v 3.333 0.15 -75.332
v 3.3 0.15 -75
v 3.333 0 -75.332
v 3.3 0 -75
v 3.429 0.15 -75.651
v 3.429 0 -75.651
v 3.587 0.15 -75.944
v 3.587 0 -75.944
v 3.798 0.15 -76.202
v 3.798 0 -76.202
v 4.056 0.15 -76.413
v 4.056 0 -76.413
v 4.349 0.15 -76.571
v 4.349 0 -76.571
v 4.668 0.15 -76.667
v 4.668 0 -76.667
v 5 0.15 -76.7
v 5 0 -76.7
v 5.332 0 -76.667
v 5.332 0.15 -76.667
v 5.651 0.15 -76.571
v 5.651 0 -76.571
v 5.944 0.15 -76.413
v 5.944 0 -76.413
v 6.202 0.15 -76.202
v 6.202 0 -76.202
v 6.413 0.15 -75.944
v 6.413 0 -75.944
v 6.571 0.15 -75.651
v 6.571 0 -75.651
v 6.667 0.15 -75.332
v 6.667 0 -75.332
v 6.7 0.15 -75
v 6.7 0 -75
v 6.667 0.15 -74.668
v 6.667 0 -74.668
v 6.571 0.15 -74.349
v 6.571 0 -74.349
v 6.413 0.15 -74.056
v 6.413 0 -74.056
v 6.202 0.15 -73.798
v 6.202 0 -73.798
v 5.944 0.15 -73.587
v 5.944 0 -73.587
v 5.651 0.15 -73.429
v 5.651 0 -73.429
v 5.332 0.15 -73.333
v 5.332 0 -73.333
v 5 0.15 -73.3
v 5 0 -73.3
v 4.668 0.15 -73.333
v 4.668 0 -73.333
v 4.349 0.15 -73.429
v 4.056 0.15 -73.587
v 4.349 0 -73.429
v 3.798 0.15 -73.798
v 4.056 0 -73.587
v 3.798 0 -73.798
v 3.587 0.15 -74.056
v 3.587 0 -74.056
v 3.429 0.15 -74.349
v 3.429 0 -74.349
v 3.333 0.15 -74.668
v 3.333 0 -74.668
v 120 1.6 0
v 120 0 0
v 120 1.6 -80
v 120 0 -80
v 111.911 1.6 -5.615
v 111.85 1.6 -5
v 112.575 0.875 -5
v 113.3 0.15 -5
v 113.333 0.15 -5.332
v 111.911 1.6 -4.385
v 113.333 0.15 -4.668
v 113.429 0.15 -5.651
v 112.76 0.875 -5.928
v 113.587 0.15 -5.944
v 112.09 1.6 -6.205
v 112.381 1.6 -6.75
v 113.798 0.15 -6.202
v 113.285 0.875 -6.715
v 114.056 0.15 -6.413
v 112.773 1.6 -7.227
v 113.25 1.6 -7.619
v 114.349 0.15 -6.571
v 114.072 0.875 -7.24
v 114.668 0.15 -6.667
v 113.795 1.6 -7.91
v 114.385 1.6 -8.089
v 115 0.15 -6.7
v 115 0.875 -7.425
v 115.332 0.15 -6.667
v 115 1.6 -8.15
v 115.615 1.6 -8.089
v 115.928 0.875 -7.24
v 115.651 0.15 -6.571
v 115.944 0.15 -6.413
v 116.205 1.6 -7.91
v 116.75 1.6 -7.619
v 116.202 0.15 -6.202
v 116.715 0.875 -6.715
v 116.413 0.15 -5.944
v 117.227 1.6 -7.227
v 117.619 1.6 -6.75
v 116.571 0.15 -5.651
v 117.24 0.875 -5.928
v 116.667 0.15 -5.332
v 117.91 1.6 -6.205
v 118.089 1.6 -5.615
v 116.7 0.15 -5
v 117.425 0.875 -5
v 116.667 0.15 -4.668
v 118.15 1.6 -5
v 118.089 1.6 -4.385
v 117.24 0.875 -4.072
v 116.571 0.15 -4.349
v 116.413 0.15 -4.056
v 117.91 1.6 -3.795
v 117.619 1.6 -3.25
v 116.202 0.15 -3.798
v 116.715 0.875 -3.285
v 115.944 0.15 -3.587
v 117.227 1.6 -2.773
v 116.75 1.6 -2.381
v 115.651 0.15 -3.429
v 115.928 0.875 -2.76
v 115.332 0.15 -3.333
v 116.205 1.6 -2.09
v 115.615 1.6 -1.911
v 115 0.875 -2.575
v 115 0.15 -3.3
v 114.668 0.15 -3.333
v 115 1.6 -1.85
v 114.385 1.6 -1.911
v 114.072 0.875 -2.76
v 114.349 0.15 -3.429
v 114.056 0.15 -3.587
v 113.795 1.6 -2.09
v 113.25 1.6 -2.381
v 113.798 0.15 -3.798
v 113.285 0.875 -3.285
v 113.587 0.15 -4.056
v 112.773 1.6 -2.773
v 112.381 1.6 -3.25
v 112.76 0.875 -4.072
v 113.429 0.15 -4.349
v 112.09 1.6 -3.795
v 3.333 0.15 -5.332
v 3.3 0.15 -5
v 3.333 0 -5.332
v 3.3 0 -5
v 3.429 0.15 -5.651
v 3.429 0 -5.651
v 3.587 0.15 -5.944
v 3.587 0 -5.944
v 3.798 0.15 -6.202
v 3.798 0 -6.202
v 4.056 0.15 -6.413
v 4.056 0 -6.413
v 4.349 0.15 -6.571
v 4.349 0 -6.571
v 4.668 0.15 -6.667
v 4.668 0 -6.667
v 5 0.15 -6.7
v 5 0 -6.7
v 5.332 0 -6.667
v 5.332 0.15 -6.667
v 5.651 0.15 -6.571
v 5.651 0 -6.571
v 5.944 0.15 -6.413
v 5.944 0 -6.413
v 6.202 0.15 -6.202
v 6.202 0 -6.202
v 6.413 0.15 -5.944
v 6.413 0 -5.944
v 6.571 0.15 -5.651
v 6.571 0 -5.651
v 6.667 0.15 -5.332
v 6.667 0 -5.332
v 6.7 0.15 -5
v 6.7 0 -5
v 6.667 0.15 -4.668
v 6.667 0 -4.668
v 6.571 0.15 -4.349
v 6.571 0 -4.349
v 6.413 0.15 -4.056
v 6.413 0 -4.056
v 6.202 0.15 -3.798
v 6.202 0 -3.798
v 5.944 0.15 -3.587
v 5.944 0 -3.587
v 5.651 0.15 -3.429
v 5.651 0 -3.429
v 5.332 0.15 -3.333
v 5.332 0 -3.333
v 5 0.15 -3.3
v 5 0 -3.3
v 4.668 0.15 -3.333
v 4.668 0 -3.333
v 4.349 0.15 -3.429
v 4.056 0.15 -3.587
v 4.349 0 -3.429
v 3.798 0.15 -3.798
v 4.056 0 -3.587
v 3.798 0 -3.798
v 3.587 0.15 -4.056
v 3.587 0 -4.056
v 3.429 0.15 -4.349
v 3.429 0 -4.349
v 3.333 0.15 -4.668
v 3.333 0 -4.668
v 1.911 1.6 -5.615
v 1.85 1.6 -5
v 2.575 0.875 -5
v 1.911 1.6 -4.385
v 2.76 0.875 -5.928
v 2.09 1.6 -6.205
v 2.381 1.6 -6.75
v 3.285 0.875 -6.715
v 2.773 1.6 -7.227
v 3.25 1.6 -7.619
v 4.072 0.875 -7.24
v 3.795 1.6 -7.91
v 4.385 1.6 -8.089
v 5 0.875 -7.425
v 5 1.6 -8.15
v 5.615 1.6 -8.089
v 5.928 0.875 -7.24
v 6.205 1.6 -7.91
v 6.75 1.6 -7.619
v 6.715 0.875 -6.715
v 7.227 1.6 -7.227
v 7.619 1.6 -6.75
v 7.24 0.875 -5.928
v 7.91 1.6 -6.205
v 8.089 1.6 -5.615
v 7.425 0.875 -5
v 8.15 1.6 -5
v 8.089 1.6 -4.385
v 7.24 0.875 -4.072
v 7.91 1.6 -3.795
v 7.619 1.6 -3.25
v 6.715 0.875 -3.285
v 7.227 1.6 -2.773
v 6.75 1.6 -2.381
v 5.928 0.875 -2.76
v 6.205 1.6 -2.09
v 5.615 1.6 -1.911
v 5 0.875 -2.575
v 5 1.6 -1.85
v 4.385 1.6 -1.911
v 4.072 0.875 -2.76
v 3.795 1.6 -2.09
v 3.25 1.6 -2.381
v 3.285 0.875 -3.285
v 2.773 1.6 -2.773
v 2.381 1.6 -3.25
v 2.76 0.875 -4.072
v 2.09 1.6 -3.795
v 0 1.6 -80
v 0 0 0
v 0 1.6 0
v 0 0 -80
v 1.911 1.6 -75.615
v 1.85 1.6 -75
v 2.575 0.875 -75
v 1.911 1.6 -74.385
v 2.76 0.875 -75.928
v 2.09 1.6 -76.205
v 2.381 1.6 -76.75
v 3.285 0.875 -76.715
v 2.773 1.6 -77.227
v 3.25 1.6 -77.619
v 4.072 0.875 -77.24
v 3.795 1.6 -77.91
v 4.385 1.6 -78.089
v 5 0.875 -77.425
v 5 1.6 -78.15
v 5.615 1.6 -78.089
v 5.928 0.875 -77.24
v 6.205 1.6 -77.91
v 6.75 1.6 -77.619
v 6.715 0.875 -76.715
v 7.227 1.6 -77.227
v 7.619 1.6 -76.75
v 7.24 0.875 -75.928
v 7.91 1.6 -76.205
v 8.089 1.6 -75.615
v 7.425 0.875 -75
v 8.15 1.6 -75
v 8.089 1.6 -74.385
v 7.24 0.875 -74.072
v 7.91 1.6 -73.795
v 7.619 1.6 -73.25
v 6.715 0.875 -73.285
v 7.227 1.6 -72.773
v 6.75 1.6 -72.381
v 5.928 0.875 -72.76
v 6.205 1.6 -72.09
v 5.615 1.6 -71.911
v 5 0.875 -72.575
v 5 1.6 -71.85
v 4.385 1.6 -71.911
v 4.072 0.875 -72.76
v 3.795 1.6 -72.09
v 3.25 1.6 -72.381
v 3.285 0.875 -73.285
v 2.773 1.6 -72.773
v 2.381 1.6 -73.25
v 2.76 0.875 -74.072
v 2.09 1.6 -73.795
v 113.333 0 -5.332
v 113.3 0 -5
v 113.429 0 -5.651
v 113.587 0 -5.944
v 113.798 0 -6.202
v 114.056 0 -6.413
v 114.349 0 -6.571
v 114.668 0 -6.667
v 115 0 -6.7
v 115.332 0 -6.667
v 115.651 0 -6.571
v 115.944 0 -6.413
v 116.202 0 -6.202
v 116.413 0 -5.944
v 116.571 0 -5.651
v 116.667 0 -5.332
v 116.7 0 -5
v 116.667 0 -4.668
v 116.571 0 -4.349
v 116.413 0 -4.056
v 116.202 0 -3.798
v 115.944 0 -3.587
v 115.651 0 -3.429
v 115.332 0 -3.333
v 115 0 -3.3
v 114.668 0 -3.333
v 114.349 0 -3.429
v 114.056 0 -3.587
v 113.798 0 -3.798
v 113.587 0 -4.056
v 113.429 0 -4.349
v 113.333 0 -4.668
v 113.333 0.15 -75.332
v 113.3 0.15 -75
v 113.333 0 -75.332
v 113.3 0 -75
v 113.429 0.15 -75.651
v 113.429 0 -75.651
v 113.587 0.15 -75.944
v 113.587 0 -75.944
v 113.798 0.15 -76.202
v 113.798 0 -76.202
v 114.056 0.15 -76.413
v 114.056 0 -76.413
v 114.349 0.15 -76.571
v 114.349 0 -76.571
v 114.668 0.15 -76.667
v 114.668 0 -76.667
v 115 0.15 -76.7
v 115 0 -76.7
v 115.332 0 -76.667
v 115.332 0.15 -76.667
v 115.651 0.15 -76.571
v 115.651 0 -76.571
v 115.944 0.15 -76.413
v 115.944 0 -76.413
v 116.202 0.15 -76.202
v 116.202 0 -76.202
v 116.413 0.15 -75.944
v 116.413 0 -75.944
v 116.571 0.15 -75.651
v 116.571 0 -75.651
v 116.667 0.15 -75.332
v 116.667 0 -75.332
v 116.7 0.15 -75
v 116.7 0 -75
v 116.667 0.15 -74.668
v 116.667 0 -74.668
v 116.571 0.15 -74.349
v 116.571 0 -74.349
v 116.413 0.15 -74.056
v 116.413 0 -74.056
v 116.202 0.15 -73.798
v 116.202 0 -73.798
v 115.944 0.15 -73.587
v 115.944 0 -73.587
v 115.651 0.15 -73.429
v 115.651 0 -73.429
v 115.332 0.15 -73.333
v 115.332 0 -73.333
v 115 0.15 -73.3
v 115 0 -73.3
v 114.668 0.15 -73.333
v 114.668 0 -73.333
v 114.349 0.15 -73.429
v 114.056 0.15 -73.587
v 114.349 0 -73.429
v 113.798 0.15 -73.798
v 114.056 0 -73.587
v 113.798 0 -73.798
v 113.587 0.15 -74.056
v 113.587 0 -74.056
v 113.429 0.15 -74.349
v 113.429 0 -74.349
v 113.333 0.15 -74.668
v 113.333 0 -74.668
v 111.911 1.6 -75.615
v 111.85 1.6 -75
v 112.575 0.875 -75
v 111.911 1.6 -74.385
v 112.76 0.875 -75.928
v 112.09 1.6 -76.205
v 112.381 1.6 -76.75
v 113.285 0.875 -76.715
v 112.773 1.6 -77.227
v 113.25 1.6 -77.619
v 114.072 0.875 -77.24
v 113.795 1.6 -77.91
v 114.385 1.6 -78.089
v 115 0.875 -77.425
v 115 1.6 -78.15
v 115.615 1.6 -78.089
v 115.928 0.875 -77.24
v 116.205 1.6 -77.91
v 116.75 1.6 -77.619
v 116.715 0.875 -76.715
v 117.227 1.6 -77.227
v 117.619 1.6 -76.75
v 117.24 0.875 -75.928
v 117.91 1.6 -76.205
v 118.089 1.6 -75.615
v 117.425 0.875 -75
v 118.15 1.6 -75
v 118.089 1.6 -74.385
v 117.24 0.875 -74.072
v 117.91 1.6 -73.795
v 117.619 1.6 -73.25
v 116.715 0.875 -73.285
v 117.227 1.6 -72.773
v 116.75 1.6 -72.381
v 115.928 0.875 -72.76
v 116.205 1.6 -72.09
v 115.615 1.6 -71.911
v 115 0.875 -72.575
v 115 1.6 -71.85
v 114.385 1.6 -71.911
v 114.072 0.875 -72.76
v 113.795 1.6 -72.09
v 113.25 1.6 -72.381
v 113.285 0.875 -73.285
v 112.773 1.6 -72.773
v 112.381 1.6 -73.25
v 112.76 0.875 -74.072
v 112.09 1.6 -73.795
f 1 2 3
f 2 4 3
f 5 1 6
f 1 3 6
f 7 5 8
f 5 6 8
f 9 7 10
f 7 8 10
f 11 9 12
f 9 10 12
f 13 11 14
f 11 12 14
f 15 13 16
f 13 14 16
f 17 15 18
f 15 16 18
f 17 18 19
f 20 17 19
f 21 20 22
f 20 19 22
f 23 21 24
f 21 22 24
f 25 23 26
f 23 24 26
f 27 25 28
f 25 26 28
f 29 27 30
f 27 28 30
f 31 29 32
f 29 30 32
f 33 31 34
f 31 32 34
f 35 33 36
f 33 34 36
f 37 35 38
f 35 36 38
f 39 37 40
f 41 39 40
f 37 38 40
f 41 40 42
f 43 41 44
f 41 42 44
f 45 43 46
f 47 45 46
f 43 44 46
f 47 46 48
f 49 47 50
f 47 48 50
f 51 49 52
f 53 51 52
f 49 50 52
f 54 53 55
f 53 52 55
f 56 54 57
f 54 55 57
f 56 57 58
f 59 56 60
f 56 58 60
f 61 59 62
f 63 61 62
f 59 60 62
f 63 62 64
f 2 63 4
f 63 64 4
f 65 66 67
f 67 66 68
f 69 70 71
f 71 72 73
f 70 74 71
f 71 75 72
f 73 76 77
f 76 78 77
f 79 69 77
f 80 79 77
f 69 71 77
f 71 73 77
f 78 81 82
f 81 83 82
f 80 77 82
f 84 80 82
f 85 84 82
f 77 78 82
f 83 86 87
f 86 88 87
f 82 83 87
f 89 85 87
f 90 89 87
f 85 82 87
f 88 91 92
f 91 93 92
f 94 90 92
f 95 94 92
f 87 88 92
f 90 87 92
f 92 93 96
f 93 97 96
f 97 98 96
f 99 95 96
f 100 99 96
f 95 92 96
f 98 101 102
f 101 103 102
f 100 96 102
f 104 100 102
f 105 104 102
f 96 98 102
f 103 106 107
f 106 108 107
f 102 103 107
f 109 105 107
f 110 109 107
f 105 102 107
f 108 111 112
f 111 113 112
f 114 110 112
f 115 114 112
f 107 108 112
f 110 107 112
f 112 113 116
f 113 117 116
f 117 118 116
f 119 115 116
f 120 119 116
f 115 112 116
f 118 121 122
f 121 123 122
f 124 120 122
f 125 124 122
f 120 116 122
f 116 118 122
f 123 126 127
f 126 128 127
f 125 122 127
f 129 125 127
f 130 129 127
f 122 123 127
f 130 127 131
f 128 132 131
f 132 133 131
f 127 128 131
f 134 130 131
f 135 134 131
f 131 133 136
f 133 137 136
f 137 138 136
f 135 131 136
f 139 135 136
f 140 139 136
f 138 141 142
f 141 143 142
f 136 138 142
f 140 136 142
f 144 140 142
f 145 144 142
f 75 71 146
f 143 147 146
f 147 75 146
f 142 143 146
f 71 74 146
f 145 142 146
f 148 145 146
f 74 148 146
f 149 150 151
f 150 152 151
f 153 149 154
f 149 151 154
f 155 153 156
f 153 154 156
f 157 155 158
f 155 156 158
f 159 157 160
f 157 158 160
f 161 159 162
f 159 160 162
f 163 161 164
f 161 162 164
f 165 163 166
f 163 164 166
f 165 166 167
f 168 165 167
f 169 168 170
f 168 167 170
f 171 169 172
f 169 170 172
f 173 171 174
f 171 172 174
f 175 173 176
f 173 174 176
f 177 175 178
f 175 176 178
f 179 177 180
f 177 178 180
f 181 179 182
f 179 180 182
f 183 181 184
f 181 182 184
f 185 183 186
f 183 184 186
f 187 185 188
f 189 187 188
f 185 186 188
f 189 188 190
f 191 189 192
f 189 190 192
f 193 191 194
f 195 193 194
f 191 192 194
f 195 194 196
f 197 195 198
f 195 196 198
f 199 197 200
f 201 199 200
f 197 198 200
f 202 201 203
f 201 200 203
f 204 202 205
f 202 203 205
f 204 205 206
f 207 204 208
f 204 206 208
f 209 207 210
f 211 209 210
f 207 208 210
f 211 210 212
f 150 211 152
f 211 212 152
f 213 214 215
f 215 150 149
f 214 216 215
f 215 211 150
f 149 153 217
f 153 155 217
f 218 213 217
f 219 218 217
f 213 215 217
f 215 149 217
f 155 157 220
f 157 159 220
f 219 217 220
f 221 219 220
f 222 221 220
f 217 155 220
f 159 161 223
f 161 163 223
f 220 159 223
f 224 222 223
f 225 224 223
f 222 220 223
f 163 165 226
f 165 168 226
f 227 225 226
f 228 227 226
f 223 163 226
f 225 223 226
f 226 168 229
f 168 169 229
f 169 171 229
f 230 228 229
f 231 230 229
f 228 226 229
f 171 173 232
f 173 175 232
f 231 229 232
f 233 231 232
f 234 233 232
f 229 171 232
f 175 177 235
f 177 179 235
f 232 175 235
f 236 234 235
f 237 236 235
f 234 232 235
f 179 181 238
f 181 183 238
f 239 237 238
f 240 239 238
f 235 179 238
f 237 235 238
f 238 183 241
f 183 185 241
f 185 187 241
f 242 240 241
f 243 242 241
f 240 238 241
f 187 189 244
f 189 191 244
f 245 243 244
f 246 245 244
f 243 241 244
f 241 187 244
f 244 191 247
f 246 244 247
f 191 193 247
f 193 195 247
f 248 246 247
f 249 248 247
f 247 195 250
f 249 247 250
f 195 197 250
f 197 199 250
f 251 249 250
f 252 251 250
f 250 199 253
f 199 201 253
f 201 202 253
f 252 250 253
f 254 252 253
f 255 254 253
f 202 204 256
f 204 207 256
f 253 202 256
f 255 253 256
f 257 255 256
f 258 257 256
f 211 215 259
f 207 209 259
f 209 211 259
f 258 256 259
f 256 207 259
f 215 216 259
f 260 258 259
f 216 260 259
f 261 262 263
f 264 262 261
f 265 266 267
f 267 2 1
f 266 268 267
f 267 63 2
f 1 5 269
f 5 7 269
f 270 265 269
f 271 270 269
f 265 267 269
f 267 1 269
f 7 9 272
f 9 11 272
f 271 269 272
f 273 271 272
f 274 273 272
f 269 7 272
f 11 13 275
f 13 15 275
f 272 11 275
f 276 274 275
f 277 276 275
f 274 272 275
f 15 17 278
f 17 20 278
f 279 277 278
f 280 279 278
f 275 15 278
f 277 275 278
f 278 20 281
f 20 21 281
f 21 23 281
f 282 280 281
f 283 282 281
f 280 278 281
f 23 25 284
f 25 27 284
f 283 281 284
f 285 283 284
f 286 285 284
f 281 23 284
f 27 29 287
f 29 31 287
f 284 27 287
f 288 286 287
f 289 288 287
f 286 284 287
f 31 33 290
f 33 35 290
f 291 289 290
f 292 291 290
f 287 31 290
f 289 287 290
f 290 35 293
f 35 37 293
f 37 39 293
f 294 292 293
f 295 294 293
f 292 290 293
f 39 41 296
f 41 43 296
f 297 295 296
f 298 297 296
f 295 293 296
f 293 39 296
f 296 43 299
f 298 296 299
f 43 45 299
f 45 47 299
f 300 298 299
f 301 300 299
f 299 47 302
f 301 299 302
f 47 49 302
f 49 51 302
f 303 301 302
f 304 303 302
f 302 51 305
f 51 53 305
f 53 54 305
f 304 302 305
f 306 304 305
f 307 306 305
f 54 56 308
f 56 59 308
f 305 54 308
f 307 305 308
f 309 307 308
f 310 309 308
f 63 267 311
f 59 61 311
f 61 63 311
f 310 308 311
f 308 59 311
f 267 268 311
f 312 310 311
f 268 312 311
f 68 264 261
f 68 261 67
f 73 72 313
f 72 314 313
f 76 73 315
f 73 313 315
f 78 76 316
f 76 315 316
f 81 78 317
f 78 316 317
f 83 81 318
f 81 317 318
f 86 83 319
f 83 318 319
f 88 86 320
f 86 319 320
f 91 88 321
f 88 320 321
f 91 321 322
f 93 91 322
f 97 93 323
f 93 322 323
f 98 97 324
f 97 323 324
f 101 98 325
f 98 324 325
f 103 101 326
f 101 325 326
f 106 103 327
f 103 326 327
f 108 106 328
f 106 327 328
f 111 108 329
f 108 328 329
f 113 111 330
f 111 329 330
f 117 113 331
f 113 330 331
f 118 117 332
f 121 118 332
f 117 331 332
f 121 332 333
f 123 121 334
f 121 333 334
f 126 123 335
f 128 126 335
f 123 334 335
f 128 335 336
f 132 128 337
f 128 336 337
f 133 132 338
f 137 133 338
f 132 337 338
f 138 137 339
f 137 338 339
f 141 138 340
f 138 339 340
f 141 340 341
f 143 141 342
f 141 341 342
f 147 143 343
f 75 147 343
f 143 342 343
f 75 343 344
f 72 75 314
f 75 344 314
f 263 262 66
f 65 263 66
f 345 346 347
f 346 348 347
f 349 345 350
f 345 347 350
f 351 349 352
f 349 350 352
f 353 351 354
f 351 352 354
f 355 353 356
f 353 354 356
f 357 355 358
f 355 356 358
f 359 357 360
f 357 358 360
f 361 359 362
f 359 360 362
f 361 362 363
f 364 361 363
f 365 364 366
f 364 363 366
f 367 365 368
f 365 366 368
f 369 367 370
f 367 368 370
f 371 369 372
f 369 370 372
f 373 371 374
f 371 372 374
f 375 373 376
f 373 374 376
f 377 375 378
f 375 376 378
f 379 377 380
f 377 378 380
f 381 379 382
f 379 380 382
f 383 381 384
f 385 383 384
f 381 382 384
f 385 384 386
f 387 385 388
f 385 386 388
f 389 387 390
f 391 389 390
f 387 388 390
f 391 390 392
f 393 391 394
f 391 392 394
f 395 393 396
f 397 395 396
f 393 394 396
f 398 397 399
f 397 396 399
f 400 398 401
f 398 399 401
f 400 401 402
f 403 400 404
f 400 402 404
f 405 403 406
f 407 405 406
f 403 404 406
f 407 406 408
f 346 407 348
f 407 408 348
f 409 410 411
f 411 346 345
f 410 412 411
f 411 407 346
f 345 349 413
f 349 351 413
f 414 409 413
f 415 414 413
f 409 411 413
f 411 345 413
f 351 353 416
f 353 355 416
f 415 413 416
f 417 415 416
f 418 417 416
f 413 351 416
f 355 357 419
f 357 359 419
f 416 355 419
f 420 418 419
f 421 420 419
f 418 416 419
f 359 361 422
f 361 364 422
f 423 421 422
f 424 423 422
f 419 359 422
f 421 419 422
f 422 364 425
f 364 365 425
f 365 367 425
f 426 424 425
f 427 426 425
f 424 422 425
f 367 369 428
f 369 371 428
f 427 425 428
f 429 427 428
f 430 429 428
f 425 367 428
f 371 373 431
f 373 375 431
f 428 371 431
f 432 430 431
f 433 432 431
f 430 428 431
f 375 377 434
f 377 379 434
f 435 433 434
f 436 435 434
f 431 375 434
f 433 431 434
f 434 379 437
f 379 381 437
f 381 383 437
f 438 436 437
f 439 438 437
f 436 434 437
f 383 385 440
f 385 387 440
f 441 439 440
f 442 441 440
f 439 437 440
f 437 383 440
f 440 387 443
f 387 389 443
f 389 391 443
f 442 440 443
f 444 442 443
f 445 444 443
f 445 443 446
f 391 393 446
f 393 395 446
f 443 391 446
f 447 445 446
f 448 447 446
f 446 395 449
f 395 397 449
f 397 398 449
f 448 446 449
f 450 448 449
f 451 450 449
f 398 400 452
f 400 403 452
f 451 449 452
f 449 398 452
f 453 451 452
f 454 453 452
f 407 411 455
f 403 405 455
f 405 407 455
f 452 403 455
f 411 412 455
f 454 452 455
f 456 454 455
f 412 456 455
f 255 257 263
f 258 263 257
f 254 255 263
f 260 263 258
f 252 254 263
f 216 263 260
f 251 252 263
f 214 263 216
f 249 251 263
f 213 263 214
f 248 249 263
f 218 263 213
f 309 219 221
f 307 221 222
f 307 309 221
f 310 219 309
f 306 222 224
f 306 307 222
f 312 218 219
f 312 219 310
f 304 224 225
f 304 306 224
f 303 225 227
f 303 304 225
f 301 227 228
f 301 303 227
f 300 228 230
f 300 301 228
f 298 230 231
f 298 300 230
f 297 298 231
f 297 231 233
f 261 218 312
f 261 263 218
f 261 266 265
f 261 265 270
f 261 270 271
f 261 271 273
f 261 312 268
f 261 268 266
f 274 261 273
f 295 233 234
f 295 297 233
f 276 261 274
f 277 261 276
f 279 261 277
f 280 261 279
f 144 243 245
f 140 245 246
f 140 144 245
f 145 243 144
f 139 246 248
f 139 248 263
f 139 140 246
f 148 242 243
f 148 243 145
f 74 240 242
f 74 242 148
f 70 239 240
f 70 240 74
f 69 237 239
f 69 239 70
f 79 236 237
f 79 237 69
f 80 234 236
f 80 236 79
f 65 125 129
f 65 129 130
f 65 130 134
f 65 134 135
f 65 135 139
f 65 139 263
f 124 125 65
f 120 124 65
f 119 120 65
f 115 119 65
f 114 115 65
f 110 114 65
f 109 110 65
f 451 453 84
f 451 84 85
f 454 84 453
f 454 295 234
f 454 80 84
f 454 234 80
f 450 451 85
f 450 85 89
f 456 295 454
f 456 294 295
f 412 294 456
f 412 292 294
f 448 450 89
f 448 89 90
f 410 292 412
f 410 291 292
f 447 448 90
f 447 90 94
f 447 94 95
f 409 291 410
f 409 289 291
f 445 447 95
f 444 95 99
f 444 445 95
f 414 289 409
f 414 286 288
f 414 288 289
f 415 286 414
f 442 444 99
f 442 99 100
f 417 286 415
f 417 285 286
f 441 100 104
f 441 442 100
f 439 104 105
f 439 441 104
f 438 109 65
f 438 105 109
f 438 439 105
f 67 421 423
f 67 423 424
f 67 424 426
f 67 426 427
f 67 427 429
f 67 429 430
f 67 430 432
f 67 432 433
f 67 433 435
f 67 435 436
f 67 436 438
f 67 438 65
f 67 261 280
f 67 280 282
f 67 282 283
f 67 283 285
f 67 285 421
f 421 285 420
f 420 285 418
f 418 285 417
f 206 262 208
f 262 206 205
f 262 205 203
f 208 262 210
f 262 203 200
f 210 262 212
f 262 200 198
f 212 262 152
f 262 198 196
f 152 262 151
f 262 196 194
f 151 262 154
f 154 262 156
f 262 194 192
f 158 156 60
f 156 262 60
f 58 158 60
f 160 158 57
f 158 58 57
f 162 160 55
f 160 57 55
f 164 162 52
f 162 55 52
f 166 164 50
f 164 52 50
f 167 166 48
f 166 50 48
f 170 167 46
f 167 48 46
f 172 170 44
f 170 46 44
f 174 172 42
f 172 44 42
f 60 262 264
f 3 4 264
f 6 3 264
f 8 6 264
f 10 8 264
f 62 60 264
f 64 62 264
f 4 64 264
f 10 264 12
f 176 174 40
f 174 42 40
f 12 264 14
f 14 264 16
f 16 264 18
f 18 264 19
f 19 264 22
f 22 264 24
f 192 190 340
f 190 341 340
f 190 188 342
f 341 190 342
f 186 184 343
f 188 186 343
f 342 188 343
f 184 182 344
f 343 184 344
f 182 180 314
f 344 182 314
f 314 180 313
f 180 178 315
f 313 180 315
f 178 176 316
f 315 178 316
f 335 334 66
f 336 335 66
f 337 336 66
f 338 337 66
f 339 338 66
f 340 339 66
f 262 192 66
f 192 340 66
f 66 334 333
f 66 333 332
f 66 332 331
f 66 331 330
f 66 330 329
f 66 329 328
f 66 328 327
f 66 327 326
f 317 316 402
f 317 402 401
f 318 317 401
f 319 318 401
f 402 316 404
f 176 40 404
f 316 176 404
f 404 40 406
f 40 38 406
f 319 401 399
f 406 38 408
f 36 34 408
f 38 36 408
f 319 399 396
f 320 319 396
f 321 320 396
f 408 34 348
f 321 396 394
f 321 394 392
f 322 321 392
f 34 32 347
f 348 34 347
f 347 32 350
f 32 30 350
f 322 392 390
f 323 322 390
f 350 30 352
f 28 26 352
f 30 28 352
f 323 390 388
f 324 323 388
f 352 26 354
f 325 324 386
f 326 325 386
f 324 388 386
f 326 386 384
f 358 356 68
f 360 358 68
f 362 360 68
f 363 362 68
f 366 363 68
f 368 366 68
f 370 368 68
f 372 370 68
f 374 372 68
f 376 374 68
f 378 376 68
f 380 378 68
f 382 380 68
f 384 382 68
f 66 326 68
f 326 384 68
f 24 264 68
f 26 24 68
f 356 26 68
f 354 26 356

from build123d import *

# Parameters (mm, degrees)
SKETCH1_W                                           = 120
SKETCH1_H                                           = 80
BOSS_EXTRUDE1_DEPTH                                 = 1.6
CSK_FOR_M3_COUNTERSUNK_FLAT_HEAD_SCREW1_D           = 3.4
CSK_FOR_M3_COUNTERSUNK_FLAT_HEAD_SCREW1_DEPTH       = 30
CSK_FOR_M3_COUNTERSUNK_FLAT_HEAD_SCREW1_CSINK_D     = 6.3
CSK_FOR_M3_COUNTERSUNK_FLAT_HEAD_SCREW1_CSINK_ANGLE = 90
CSK_FOR_M3_COUNTERSUNK_FLAT_HEAD_SCREW1_TIP         = 1.021463052


with BuildPart() as part:
    # Sketch1 → Boss-Extrude1 (new body)
    with BuildSketch(Plane(origin=(0, 0, 0), x_dir=(1, 0, 0), z_dir=(0, 1, 0))):
        with Locations((60, 40)):
            Rectangle(SKETCH1_W, SKETCH1_H)
    extrude(amount=BOSS_EXTRUDE1_DEPTH)

    # CSK for M3 Countersunk Flat Head Screw1
    with Locations(Plane(origin=(0, 1.6, 0), x_dir=(1, 0, 0), z_dir=(0, 1, 0))):
        with Locations((5, 75), (5, 5), (115, 5), (115, 75)):
            CounterSinkHole(CSK_FOR_M3_COUNTERSUNK_FLAT_HEAD_SCREW1_D / 2, CSK_FOR_M3_COUNTERSUNK_FLAT_HEAD_SCREW1_CSINK_D / 2, depth=CSK_FOR_M3_COUNTERSUNK_FLAT_HEAD_SCREW1_DEPTH, counter_sink_angle=CSK_FOR_M3_COUNTERSUNK_FLAT_HEAD_SCREW1_CSINK_ANGLE)
            with Locations((0, 0, -(CSK_FOR_M3_COUNTERSUNK_FLAT_HEAD_SCREW1_DEPTH + CSK_FOR_M3_COUNTERSUNK_FLAT_HEAD_SCREW1_TIP / 2))):  # 118° drill point
                Cone(0, CSK_FOR_M3_COUNTERSUNK_FLAT_HEAD_SCREW1_D / 2, CSK_FOR_M3_COUNTERSUNK_FLAT_HEAD_SCREW1_TIP, mode=Mode.SUBTRACT)


solid = part.part
